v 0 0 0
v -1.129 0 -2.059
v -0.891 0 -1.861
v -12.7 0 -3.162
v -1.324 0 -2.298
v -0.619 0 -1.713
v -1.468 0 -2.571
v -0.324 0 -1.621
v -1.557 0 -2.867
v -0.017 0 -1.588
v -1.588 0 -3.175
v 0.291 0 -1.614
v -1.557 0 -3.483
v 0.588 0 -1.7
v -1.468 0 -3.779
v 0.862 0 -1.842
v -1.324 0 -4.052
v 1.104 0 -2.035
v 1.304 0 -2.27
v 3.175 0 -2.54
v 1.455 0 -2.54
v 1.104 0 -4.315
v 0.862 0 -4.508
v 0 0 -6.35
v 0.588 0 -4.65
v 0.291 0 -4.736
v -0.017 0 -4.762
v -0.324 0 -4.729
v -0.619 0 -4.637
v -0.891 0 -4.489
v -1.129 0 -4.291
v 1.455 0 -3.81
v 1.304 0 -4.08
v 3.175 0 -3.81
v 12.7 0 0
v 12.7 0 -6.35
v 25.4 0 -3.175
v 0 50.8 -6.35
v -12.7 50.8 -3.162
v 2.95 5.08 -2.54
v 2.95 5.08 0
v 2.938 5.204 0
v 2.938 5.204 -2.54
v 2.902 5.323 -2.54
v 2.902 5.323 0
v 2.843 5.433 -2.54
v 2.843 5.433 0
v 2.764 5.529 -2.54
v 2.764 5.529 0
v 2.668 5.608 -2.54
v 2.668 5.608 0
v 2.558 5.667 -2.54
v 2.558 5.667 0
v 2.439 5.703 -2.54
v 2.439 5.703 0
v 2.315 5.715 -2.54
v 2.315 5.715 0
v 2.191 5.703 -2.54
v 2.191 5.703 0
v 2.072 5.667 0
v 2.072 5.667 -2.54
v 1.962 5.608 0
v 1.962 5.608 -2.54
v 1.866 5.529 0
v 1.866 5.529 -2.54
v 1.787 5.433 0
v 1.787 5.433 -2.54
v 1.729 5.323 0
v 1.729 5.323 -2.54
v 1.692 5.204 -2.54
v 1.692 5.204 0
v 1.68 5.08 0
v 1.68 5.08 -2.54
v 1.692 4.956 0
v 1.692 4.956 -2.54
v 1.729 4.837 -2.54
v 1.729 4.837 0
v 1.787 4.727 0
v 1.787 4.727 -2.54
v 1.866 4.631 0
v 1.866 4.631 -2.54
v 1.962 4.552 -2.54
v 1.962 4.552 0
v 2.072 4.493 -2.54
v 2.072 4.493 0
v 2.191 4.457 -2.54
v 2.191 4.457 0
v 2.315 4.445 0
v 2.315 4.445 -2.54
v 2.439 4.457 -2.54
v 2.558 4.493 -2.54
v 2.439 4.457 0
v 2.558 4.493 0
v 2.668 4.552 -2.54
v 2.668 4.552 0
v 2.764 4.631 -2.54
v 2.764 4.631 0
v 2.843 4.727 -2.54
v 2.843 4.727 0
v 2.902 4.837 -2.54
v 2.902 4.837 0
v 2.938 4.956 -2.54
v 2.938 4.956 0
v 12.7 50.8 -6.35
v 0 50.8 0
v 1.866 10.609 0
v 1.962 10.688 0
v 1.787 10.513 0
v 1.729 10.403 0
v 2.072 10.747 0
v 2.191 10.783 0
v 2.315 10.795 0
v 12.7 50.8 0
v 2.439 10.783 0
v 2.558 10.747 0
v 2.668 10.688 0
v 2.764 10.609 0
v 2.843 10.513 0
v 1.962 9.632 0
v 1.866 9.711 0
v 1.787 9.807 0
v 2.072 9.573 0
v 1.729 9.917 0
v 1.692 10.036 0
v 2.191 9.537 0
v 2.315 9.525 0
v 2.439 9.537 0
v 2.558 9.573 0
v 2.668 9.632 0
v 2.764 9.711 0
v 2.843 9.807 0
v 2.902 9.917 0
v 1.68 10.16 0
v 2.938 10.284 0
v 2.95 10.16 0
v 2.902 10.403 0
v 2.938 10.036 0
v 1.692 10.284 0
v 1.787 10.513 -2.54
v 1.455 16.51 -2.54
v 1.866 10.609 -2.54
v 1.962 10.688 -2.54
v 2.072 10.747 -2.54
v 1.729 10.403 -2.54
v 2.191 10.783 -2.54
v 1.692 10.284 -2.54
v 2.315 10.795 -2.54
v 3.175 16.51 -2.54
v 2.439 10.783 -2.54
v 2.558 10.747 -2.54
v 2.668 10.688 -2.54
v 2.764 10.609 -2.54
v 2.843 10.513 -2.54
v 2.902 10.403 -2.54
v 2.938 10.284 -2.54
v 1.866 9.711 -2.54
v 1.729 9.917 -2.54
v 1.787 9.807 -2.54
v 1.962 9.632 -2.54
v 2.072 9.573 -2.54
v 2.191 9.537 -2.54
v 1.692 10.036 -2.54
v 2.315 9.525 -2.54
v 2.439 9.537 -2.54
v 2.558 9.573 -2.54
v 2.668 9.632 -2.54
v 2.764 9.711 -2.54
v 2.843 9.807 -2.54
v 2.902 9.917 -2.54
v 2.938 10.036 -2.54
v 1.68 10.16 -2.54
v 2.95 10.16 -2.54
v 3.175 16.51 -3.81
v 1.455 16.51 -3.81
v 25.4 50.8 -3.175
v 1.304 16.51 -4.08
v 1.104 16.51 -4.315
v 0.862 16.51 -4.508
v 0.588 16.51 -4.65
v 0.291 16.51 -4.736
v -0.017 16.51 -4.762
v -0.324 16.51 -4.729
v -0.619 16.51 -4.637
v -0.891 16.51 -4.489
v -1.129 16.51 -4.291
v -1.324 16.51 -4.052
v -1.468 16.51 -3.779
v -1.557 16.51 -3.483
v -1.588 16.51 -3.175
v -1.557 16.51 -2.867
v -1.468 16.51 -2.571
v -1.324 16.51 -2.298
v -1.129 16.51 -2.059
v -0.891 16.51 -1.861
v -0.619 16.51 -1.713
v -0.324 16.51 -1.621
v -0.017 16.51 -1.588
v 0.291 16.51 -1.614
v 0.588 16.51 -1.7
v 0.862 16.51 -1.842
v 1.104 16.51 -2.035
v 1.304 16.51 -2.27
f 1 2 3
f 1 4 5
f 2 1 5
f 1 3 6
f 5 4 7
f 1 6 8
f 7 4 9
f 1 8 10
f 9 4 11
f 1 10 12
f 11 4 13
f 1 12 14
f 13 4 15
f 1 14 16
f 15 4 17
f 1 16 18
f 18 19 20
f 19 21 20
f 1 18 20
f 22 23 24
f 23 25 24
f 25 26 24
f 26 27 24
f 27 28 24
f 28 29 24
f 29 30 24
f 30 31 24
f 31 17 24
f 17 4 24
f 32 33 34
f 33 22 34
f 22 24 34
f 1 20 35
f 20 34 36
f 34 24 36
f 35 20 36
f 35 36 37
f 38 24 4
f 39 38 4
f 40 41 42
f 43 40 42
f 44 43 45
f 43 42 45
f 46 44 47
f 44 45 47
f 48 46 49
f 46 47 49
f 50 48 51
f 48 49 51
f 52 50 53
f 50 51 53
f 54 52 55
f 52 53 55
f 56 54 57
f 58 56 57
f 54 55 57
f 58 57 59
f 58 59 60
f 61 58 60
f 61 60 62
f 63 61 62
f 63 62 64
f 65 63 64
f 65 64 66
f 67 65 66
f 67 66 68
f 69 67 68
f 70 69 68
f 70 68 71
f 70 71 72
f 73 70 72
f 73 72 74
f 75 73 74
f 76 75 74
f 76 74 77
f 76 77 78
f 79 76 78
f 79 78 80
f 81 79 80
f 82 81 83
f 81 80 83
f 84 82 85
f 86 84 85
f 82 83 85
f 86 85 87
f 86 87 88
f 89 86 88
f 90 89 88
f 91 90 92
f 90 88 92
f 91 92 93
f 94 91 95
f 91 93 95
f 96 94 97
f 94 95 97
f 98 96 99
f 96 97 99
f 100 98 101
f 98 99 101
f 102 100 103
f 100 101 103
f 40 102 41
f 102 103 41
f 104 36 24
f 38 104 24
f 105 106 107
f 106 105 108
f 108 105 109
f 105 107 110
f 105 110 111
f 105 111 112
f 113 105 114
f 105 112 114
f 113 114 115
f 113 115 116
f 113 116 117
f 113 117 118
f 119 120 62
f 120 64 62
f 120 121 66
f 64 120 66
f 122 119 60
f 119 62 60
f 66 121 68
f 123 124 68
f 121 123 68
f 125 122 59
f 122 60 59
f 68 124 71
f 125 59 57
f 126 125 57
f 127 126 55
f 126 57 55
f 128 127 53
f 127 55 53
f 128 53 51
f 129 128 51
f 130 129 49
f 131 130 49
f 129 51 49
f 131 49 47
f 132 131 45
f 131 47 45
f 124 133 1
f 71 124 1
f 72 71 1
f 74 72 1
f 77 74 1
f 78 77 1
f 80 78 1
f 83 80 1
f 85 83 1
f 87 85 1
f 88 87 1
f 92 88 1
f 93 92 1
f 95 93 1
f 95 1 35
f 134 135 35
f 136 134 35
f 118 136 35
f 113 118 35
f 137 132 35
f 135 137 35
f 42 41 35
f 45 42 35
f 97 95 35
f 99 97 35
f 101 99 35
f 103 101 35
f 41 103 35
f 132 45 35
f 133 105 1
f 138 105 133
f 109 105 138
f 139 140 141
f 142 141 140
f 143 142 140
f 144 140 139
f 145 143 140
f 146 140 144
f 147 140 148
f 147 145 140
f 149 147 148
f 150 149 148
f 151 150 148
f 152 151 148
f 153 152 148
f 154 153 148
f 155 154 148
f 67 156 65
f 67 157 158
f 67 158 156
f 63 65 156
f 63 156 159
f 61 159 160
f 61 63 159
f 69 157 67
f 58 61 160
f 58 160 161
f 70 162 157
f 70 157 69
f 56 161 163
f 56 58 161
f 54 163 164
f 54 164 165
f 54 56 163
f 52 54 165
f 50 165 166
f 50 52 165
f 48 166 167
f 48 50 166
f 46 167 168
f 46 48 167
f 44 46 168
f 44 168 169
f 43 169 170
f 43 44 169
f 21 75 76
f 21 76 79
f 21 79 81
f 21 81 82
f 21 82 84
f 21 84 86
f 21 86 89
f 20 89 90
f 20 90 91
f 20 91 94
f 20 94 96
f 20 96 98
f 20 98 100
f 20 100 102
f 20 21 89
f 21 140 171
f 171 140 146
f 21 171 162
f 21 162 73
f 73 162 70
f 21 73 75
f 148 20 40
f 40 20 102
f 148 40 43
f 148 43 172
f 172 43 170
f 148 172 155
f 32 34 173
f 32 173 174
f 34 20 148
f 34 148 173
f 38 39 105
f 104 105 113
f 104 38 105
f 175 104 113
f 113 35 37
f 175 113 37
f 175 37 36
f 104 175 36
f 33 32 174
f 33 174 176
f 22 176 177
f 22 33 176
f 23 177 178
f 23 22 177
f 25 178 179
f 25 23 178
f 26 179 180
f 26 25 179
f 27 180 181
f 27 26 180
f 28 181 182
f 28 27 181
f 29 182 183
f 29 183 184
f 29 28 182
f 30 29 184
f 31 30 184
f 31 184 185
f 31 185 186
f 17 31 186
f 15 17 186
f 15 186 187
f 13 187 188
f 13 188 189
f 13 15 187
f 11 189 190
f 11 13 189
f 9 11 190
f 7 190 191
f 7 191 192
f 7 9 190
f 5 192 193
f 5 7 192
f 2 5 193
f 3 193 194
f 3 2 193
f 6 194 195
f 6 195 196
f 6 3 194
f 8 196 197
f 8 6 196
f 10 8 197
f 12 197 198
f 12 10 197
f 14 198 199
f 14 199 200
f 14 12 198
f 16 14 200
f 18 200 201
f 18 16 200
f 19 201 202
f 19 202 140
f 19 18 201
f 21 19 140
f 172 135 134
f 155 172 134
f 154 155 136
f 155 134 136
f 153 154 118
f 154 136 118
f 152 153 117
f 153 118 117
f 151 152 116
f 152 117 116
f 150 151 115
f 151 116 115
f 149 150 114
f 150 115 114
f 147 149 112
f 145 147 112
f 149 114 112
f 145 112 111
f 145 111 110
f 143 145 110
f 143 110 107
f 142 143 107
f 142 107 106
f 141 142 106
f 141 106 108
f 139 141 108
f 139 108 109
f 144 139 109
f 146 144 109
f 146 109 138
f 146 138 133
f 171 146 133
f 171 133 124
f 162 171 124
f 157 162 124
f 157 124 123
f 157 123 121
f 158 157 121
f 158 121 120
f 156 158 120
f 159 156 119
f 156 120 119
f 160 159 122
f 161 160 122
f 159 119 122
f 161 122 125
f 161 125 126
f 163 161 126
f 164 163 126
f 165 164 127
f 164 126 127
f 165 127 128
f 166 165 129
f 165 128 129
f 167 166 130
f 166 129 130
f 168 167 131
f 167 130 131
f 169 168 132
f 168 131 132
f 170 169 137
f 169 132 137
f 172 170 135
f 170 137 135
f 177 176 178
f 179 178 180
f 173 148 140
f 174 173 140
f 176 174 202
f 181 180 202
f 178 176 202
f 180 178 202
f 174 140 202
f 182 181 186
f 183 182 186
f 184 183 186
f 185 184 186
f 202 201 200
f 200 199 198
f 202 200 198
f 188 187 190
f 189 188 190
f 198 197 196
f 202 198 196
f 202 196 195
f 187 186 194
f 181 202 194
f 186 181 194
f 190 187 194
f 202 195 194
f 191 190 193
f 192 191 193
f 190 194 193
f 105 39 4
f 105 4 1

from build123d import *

# Parameters (mm, degrees)
BOSS_EXTRUDE1_DEPTH = 50.8
CUT_EXTRUDE1_DEPTH  = 16.51
SKETCH3_R           = 0.635
CUT_EXTRUDE2_DEPTH  = 3.175


with BuildPart() as part:
    # Sketch1 → Boss-Extrude1 (new body)
    with BuildSketch(Plane(origin=(0, 0, 0), x_dir=(1, 0, 0), z_dir=(0, 1, 0))):
        Polygon((0, 6.35), (-12.7, 3.1623), (0, 0), (12.7, 0), (25.4, 3.175), (12.7, 6.35), align=None)
    extrude(amount=BOSS_EXTRUDE1_DEPTH)

    # Sketch2 → Cut-Extrude1 (cut)
    with BuildSketch(Plane.XZ):
        with BuildLine():
            Line((3.175, -2.54), (3.175, -3.81))
            Line((3.175, -3.81), (1.454967783, -3.81))
            ThreePointArc((1.454967783, -3.81), (-1.5875, -3.175), (1.454967783, -2.54))
            Line((1.454967783, -2.54), (3.175, -2.54))
        make_face()
    extrude(amount=-CUT_EXTRUDE1_DEPTH, mode=Mode.SUBTRACT)

    # Sketch3 → Cut-Extrude2 (cut)
    with BuildSketch(Plane.XY):
        with Locations((2.31521, 5.08)):
            Circle(SKETCH3_R)
        with Locations((2.31521, 10.16)):
            Circle(SKETCH3_R)
    extrude(amount=-CUT_EXTRUDE2_DEPTH, mode=Mode.SUBTRACT)


solid = part.part
